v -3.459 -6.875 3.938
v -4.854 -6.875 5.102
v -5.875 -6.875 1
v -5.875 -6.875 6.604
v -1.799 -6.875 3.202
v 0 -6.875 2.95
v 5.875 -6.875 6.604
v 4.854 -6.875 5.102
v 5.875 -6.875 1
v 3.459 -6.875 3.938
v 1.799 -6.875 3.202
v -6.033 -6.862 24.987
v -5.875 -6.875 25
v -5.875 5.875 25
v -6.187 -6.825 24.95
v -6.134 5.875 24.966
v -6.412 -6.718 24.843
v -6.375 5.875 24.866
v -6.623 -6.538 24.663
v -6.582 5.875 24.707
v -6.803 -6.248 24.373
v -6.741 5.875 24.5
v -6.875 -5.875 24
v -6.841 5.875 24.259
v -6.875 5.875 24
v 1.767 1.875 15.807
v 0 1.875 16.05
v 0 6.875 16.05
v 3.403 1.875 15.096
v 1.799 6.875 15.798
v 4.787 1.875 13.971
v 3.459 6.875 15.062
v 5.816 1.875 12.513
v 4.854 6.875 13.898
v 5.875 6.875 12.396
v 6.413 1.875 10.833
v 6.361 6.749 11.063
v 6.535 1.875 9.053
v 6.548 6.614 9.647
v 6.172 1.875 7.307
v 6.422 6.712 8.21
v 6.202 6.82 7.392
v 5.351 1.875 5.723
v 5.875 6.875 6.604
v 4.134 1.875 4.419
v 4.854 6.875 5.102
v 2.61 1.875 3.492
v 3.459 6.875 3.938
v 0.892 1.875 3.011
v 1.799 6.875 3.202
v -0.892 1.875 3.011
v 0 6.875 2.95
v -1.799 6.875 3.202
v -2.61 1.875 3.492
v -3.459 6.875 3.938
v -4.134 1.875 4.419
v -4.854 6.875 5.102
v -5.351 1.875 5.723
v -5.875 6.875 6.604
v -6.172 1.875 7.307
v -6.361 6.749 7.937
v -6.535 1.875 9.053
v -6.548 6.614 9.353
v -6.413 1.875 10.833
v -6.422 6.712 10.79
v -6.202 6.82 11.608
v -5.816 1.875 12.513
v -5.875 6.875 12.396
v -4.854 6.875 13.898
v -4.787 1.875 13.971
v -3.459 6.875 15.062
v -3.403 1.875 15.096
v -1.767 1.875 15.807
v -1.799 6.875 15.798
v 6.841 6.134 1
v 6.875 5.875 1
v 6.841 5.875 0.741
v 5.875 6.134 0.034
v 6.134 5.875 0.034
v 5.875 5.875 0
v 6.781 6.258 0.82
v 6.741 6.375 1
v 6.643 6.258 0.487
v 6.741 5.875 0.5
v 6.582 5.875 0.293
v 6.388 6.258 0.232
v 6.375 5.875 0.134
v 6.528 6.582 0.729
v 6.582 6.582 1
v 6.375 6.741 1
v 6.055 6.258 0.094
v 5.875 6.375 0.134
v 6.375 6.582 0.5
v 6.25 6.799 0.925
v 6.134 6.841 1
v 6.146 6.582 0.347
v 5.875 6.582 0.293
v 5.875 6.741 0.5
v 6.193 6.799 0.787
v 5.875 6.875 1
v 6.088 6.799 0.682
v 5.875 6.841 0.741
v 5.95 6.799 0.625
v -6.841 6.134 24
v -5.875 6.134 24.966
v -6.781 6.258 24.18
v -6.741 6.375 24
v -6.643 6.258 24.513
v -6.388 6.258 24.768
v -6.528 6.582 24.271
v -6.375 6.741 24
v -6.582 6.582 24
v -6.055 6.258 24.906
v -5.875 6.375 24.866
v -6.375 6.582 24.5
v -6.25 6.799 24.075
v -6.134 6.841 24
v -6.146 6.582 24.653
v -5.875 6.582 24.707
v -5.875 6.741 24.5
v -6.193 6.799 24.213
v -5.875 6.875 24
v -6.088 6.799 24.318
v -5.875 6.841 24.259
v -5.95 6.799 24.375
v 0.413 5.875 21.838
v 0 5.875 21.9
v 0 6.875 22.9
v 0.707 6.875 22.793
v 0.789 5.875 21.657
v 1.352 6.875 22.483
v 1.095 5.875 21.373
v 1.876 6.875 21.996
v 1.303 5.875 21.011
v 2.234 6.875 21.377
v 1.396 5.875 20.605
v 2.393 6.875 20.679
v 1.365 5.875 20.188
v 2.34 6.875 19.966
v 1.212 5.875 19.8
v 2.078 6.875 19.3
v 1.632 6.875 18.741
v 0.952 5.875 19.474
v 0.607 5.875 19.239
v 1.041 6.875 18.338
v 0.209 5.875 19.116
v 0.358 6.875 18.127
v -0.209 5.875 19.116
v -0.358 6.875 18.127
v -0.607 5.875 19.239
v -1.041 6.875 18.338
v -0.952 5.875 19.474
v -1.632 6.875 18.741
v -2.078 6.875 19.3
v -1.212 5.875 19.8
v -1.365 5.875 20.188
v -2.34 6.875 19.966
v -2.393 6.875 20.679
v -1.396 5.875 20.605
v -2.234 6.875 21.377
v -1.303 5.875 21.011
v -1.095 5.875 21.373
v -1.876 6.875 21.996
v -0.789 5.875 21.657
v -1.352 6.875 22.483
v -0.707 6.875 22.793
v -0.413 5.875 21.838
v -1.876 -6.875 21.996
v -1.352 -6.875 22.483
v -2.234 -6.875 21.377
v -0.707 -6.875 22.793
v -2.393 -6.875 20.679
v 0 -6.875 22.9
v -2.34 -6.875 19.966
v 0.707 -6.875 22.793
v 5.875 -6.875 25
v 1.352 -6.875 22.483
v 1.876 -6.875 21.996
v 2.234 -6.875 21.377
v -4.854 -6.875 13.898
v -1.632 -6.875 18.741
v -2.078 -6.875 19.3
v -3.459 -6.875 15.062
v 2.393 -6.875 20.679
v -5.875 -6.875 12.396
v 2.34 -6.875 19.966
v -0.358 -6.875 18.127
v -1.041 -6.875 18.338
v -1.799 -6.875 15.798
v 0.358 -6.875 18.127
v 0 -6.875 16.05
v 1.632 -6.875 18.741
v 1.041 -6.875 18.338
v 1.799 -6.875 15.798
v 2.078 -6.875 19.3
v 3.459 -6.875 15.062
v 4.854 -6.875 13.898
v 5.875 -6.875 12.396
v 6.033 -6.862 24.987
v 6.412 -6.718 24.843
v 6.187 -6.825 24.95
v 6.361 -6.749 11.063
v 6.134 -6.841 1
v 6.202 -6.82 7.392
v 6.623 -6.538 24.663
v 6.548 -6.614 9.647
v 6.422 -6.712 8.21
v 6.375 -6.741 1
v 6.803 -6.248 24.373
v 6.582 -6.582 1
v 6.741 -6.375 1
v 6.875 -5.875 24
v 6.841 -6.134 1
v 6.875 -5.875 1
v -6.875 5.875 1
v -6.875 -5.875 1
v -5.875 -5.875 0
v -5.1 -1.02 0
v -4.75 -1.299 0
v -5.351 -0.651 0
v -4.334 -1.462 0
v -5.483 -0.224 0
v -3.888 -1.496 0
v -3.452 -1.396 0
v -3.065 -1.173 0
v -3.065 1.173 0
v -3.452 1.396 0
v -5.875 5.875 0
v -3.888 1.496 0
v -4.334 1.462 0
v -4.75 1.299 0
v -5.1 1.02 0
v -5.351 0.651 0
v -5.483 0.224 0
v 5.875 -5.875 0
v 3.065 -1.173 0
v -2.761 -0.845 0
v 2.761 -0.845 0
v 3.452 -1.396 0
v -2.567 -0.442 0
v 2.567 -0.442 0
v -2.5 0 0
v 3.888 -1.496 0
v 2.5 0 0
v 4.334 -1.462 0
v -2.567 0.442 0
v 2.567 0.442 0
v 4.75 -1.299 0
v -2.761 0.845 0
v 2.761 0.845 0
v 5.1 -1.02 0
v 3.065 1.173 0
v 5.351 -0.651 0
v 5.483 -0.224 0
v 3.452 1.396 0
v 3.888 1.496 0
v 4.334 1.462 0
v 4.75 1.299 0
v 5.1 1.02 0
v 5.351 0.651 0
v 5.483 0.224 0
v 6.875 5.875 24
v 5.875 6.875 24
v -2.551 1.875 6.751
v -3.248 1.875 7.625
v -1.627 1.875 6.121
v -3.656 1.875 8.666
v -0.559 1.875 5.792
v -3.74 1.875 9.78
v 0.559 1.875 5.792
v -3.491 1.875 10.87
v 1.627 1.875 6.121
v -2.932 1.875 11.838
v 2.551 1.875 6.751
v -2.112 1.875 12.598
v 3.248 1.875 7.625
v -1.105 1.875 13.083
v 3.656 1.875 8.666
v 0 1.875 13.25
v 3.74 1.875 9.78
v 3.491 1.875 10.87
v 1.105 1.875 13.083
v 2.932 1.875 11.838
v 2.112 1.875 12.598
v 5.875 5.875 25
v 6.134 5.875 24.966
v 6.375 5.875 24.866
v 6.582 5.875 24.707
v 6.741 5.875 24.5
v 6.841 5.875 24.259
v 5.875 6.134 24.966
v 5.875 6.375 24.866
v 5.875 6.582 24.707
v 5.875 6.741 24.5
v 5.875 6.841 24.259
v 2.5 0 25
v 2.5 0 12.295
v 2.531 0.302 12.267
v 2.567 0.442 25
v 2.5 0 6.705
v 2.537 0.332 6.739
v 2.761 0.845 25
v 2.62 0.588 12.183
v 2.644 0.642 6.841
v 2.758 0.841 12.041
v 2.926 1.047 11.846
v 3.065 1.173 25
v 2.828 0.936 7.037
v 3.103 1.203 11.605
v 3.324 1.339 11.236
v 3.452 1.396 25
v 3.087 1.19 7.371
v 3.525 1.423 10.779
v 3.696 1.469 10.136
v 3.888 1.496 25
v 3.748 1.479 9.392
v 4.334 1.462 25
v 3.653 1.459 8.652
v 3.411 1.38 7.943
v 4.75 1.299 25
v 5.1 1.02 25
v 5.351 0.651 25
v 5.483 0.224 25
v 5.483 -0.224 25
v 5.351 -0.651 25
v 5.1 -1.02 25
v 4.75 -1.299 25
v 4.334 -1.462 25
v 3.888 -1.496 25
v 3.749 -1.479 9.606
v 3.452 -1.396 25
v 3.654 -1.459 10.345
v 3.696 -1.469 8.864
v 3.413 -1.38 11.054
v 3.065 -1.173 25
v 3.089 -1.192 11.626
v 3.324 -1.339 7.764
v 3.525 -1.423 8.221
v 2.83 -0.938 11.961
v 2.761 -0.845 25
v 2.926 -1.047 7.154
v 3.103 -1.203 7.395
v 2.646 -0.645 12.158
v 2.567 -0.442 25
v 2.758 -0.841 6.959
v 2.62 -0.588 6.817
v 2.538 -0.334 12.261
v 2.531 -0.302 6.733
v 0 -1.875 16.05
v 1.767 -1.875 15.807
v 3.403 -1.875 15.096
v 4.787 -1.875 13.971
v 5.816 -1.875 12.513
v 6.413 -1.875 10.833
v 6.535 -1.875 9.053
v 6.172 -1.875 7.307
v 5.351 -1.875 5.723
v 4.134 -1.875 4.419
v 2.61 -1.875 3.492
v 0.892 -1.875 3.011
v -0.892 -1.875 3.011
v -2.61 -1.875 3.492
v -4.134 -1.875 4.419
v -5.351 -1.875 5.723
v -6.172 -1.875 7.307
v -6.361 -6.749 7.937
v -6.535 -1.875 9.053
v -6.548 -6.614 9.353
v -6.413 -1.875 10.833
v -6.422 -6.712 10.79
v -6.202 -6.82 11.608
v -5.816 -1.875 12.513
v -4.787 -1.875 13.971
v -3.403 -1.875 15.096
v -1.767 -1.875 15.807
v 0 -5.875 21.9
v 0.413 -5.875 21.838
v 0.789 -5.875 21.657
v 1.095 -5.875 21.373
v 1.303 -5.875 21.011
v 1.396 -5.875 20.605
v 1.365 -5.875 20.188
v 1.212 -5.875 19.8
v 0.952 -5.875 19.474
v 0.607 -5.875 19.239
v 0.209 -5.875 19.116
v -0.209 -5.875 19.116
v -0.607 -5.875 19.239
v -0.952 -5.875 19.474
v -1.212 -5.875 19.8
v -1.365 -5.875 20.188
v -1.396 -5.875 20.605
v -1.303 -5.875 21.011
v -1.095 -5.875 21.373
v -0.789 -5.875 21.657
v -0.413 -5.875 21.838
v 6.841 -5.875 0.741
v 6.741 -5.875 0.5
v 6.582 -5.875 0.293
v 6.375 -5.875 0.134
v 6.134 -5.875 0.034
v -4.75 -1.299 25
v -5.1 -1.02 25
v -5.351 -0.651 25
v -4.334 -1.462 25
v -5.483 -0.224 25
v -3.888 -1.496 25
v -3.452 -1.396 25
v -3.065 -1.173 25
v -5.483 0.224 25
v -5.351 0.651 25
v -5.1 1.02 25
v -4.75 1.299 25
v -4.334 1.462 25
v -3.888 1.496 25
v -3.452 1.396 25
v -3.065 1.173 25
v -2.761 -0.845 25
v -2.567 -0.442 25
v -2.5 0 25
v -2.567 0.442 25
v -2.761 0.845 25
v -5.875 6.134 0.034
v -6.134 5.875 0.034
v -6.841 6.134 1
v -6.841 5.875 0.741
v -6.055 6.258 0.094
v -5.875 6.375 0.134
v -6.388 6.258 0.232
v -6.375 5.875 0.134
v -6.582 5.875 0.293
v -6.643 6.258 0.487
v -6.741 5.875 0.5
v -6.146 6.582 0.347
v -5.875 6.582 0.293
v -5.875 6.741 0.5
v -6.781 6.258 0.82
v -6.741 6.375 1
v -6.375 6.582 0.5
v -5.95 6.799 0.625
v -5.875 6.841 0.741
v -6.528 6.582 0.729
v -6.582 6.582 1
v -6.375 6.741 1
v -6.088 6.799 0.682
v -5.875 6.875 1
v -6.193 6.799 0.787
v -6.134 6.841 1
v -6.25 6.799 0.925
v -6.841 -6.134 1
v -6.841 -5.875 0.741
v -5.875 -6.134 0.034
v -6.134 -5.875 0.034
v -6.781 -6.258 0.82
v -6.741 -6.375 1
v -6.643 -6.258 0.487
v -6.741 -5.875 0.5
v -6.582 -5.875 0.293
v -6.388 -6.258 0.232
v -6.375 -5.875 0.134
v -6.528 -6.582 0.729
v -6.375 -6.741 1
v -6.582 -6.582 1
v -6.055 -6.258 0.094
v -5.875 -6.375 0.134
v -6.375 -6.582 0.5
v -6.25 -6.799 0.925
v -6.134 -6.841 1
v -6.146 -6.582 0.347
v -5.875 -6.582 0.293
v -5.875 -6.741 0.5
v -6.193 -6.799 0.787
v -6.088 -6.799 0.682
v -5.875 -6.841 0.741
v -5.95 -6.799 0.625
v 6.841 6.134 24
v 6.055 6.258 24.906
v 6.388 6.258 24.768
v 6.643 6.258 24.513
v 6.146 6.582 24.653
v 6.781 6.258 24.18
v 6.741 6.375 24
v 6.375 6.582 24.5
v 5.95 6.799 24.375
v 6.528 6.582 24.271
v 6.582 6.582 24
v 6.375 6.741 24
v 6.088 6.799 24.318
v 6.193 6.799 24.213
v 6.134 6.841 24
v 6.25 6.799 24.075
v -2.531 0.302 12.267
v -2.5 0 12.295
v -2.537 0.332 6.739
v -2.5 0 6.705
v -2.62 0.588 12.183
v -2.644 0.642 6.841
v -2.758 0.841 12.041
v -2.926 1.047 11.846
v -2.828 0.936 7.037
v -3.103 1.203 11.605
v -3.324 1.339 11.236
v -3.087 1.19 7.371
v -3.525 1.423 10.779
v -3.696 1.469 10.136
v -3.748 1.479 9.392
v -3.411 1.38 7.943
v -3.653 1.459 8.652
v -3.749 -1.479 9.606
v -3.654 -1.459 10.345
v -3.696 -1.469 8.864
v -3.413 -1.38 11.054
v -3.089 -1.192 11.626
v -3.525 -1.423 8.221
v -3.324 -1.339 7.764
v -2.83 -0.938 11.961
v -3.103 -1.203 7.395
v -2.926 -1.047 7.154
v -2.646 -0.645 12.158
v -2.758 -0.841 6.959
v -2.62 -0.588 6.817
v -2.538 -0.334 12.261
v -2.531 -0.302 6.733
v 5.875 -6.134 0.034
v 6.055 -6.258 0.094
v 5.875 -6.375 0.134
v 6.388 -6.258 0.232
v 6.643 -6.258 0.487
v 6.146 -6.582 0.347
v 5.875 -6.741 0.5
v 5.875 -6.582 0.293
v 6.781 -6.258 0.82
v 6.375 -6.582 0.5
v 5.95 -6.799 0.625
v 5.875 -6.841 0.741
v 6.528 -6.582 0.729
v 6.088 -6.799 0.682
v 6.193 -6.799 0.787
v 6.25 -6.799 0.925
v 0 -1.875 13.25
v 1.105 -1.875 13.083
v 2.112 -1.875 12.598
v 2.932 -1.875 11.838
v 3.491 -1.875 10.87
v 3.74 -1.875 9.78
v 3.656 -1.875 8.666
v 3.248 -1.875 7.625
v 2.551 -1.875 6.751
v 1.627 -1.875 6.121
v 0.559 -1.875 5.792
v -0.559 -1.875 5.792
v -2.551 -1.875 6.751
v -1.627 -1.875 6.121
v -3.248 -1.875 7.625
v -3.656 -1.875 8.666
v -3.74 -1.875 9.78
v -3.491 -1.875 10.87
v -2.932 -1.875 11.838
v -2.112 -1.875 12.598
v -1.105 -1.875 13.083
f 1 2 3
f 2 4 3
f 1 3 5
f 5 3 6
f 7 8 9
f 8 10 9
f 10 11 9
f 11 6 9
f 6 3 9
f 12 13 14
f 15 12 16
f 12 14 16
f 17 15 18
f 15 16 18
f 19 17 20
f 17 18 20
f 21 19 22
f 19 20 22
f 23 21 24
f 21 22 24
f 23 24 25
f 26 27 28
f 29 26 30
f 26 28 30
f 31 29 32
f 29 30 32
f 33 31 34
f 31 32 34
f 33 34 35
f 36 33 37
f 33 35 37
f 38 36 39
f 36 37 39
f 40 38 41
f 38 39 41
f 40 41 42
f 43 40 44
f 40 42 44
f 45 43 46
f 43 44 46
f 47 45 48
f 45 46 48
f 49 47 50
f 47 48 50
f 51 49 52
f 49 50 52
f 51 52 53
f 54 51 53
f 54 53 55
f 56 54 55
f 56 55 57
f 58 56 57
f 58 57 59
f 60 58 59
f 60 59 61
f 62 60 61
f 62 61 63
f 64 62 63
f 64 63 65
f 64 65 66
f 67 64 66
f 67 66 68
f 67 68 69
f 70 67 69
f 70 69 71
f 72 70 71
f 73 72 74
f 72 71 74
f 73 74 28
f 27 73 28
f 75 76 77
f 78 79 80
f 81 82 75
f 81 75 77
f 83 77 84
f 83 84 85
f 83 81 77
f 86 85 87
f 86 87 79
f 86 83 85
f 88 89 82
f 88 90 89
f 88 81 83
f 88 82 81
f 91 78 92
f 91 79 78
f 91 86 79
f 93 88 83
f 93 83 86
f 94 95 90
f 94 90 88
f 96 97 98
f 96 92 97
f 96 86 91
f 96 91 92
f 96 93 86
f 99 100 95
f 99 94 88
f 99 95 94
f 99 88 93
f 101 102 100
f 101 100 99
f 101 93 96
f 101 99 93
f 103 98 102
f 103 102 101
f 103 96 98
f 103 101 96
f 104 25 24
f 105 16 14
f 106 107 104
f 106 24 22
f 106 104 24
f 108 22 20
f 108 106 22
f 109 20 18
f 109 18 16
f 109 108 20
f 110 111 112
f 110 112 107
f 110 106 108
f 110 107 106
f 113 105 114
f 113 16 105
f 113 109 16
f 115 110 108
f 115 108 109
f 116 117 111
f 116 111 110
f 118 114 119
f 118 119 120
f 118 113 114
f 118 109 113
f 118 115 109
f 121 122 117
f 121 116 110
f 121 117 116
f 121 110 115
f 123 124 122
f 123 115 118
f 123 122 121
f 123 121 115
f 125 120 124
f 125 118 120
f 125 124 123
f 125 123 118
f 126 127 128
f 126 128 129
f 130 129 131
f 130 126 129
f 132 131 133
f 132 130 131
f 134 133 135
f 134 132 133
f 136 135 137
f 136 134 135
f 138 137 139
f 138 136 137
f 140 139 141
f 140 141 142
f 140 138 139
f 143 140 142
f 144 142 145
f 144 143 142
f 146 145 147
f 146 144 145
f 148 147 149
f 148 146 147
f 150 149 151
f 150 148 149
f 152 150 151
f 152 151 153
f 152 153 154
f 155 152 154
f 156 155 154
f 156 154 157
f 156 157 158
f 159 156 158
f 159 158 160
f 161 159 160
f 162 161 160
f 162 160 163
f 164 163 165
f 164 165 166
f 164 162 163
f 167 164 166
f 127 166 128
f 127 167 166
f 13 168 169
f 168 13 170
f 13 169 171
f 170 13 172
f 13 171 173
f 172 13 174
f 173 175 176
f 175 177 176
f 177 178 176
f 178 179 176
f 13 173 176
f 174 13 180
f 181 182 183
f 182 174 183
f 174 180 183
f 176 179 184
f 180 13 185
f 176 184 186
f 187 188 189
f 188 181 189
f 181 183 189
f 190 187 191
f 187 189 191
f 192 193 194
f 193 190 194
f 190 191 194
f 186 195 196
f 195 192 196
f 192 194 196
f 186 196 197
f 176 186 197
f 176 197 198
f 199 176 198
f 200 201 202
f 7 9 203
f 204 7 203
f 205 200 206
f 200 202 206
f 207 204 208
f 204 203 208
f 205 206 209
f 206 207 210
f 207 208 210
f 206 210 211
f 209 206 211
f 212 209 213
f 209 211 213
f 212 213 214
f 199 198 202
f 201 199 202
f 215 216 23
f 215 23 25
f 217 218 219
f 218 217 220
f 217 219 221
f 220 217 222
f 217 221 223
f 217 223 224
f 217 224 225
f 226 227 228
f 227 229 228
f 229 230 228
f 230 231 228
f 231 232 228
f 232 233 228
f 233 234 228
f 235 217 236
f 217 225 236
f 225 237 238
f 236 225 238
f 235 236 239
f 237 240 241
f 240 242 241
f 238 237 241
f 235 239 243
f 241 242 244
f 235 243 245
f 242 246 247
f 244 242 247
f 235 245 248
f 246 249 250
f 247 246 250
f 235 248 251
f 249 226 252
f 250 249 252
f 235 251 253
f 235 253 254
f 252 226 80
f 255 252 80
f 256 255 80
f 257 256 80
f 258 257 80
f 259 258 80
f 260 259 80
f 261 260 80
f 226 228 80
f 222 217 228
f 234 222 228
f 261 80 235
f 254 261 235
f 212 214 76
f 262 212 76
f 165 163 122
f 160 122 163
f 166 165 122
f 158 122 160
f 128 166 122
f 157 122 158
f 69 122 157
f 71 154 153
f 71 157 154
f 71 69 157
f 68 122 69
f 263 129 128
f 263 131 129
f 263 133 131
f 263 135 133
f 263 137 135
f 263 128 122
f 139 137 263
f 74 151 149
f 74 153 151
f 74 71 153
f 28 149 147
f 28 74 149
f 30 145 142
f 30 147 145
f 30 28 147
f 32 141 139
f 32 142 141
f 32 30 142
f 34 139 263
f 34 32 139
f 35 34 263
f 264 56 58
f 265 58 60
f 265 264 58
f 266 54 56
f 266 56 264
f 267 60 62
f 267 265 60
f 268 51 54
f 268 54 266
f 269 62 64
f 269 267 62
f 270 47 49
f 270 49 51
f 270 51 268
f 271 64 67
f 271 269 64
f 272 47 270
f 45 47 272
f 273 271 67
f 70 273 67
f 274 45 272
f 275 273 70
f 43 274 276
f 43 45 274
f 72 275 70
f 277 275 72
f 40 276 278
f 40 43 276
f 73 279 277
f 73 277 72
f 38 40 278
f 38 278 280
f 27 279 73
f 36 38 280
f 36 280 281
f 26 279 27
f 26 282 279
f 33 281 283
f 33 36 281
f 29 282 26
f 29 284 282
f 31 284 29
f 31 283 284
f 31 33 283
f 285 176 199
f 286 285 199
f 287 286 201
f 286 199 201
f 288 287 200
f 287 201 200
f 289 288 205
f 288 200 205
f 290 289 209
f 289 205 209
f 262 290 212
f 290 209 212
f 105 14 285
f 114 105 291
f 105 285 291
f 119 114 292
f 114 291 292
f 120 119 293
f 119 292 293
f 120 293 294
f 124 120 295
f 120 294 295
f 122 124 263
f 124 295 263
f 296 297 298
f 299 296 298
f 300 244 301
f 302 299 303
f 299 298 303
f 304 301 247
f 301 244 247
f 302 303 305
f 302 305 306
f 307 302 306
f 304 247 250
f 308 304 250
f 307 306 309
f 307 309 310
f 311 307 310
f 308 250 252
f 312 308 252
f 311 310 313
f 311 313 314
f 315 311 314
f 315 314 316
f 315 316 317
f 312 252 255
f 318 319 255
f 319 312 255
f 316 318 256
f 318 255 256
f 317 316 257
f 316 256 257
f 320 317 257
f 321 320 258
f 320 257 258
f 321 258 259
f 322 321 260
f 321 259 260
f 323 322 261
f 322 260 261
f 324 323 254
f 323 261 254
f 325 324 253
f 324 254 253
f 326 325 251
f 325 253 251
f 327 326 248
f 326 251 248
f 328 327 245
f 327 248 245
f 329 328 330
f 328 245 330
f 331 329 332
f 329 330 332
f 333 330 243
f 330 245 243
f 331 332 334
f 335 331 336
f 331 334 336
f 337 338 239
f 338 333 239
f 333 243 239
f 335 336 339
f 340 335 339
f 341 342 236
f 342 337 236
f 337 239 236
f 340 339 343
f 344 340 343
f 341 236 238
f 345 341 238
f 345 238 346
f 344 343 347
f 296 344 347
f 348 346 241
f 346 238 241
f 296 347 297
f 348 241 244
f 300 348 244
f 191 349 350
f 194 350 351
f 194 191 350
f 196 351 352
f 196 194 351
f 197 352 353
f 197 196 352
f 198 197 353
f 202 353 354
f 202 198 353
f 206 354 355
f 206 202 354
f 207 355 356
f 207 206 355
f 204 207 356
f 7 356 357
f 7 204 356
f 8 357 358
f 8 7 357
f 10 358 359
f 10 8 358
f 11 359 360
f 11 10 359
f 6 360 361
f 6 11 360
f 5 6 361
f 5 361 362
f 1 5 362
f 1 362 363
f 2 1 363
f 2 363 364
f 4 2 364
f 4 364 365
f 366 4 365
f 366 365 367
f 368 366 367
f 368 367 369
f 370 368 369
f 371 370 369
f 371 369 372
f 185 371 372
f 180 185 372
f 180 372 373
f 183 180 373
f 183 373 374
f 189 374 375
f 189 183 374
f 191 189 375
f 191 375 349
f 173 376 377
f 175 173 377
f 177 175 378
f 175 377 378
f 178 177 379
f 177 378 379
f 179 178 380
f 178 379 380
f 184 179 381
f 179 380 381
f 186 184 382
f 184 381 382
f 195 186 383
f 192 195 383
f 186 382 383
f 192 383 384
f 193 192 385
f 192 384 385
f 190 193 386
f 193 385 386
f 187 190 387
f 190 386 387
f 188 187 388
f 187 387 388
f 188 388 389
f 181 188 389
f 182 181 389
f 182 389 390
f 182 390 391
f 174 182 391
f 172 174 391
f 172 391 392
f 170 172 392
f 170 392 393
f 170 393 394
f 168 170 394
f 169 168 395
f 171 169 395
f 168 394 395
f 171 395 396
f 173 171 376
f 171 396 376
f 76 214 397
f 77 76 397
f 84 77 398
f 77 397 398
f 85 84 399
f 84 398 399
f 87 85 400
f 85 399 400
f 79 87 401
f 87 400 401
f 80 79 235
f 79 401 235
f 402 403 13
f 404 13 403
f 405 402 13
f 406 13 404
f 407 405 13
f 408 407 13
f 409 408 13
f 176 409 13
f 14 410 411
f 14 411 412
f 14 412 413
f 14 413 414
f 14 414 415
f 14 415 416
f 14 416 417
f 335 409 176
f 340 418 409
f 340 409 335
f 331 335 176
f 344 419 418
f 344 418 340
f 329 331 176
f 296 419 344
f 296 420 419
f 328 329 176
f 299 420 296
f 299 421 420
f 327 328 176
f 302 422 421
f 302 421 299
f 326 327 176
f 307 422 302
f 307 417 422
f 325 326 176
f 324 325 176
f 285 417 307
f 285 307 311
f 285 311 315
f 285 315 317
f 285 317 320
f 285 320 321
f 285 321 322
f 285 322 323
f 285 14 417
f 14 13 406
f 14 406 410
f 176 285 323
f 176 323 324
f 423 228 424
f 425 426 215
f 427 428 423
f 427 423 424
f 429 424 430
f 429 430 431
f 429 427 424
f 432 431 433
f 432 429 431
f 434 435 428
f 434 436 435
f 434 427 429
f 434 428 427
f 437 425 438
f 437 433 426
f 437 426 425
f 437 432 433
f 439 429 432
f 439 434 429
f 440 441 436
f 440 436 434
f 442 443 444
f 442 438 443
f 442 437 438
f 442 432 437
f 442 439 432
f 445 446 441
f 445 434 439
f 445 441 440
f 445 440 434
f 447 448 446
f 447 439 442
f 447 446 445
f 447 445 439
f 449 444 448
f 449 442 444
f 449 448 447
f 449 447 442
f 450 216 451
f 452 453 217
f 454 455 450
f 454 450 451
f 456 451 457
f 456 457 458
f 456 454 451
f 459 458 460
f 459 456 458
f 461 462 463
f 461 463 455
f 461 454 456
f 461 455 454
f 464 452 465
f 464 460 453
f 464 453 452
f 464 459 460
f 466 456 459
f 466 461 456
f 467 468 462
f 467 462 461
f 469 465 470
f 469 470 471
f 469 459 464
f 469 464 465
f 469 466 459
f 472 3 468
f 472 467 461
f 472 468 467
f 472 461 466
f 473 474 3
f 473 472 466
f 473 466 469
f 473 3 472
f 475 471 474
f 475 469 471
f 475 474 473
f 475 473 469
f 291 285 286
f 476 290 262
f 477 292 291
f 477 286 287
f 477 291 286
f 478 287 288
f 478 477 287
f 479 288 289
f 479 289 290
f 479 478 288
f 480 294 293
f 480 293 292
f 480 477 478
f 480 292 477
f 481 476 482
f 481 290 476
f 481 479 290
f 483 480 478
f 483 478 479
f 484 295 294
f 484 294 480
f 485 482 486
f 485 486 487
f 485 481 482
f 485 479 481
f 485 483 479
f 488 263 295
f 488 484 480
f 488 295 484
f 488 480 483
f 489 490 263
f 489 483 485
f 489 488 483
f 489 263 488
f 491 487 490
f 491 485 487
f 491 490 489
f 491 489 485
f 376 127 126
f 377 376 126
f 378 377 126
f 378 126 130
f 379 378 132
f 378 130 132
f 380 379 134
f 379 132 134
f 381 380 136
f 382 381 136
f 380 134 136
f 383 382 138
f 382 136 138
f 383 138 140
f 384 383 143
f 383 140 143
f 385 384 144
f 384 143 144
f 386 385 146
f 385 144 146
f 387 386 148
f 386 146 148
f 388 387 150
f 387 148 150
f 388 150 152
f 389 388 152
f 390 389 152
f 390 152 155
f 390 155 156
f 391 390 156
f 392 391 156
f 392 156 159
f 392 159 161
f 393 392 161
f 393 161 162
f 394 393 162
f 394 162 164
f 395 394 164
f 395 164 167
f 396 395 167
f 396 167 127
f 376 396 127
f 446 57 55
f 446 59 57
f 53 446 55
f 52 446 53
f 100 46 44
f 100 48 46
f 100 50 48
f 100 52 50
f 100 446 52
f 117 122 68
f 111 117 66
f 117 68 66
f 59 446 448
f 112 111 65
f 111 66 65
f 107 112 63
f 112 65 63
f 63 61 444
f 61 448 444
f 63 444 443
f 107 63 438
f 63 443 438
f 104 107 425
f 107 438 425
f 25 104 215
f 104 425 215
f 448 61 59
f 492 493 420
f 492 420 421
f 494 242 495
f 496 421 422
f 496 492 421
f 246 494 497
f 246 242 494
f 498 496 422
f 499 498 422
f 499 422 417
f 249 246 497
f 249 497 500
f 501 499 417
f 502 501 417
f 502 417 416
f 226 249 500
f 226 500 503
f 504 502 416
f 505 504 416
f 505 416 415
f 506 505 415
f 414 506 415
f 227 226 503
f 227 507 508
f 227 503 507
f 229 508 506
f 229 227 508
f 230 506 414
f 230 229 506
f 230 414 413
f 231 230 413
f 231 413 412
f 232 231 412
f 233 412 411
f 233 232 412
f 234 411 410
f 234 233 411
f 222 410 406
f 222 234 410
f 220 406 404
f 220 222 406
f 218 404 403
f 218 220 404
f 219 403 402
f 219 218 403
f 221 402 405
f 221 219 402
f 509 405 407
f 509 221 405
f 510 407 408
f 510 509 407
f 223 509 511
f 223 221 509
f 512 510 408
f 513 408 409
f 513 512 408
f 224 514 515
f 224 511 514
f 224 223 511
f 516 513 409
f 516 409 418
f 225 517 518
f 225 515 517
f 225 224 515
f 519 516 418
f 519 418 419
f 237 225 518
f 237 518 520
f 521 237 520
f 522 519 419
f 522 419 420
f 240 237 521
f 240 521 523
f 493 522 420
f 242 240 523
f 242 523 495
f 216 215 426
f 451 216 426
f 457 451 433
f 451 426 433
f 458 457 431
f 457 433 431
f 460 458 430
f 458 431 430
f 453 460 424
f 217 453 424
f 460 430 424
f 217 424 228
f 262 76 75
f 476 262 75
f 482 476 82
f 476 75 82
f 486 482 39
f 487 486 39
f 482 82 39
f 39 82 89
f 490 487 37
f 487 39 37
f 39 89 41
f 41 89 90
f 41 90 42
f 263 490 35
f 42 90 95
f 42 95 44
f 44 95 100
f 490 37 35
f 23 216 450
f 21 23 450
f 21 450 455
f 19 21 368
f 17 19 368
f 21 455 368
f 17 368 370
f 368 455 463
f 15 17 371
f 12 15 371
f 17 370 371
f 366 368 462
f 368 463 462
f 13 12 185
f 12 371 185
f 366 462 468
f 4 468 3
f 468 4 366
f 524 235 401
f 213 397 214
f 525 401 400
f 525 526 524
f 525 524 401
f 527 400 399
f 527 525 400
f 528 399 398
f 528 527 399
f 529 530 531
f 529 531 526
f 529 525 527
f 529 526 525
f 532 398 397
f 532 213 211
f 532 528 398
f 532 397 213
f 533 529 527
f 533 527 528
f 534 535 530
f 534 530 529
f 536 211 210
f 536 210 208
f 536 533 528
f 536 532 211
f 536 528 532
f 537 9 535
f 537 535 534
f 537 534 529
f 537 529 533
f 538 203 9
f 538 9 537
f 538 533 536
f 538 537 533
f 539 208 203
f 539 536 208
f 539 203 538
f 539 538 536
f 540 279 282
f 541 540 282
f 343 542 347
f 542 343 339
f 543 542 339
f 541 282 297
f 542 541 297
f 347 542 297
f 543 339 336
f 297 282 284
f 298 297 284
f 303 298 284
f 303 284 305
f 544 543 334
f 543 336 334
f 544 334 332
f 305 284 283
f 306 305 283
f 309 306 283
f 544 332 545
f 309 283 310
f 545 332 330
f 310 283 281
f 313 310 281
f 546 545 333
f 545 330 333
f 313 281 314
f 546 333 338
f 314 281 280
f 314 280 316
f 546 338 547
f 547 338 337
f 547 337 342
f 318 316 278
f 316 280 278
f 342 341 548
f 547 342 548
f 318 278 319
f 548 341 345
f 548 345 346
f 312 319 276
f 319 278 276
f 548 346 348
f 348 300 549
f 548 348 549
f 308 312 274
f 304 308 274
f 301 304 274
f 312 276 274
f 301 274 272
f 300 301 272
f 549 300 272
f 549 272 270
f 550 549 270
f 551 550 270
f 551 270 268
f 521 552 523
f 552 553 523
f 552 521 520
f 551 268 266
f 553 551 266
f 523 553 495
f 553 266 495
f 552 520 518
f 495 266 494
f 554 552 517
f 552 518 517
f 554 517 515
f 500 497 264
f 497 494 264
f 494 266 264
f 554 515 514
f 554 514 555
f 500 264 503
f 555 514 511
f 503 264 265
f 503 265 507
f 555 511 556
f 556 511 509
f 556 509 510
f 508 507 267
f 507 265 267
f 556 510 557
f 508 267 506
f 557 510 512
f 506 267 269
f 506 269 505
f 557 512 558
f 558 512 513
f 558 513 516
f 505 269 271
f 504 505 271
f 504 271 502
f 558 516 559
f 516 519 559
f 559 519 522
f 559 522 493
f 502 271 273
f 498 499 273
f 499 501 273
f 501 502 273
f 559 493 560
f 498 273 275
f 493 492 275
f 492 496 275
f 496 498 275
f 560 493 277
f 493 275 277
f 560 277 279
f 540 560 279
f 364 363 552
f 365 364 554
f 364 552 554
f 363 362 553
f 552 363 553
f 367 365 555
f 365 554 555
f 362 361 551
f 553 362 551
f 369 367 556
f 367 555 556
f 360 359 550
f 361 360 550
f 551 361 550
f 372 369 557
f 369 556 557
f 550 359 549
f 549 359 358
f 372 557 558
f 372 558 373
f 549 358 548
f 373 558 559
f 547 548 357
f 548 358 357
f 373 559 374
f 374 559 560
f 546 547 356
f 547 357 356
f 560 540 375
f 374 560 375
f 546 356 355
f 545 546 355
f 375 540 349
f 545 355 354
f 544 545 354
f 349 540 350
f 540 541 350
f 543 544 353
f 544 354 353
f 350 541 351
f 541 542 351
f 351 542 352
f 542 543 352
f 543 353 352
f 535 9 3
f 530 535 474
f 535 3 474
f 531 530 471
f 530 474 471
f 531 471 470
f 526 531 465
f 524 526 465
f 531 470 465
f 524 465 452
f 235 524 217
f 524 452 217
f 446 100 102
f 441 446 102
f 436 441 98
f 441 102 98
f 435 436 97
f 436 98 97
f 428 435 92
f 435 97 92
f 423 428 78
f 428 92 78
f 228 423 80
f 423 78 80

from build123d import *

# Parameters (mm, degrees)
SKETCH1_W           = 13.75
SKETCH1_H           = 13.75
BOSS_EXTRUDE1_DEPTH = 25
SKETCH3_R           = 3.75
CUT_EXTRUDE2_DEPTH  = 30.348392205
SKETCH4_R           = 6.55
CUT_EXTRUDE3_DEPTH  = 5
SKETCH8_R           = 1.4
CUT_EXTRUDE6_DEPTH  = 30.348392205
SKETCH9_R           = 1.5
CUT_EXTRUDE7_DEPTH  = 27.824079667
CHAMFER1_SIZE       = 1
FILLET2_R           = 1


with BuildPart() as part:
    # Sketch1 → Boss-Extrude1 (new body)
    with BuildSketch(Plane.XY):
        Rectangle(SKETCH1_W, SKETCH1_H)
    extrude(amount=BOSS_EXTRUDE1_DEPTH)

    # Sketch3 → Cut-Extrude2 (cut, through all)
    with BuildSketch(Plane(origin=(0, 6.875, 0), x_dir=(1, 0, 0), z_dir=(0, 1, 0))):
        with Locations(Location((0, -9.5, 0), (0, 0, 270))):
            Circle(SKETCH3_R)
    extrude(amount=-CUT_EXTRUDE2_DEPTH, mode=Mode.SUBTRACT)

    # Sketch4 → Cut-Extrude3 (cut)
    with BuildSketch(Plane(origin=(0, 6.875, 0), x_dir=(1, 0, 0), z_dir=(0, 1, 0))):
        with Locations(Location((0, -9.5, 0), (0, 0, 270))):
            Circle(SKETCH4_R)
    cut_extrude3 = extrude(amount=-CUT_EXTRUDE3_DEPTH, mode=Mode.SUBTRACT)

    # Mirror4: Cut-Extrude3 across plane
    add(cut_extrude3.mirror(Plane.ZX), mode=Mode.SUBTRACT)

    # Sketch8 → Cut-Extrude6 (cut, through all)
    with BuildSketch(Plane(origin=(0, 6.875, 0), x_dir=(1, 0, 0), z_dir=(0, 1, 0))):
        with Locations(Location((0, -20.5, 0), (0, 0, 270))):
            Circle(SKETCH8_R)
    extrude(amount=-CUT_EXTRUDE6_DEPTH, mode=Mode.SUBTRACT)

    # Sketch9 → Cut-Extrude7 (cut, through all)
    with BuildSketch(Plane(origin=(0, 0, 0), x_dir=(-1, 0, 0), z_dir=(0, 0, -1))):
        with Locations((-4, 0)):
            Circle(SKETCH9_R)
    cut_extrude7 = extrude(amount=-CUT_EXTRUDE7_DEPTH, mode=Mode.SUBTRACT)

    # Mirror5: Cut-Extrude7 across plane
    add(cut_extrude7.mirror(Plane(origin=(0, 0, 0), x_dir=(0, 0, 1), z_dir=(1, 0, 0))), mode=Mode.SUBTRACT)

    # Chamfer1
    chamfer1_edges = [part.edges().sort_by_distance(p)[0] for p in [
        (0, -6.875, 19.1),
        (0, 6.875, 19.1),
    ]]
    chamfer(chamfer1_edges, length=CHAMFER1_SIZE)

    # Fillet2
    # the kernel refuses this fillet: 1 mm, written as the material it takes off along each edge
    with BuildSketch(Plane(origin=(-5.875, 5.875, 24), x_dir=(-1, 0, 0), z_dir=(0, 1, 0))) as fillet2_piece_1_section:
        Polygon((0, 0), (FILLET2_R, 0), (FILLET2_R, FILLET2_R), (0, FILLET2_R), align=None)
    fillet2_piece_1 = extrude(amount=FILLET2_R, mode=Mode.PRIVATE)
    fillet2_piece_1 = fillet2_piece_1 - Plane(origin=(-5.875, 5.875, 24), x_dir=(0.7071067811865475, 0, -0.7071067811865475), z_dir=(0, 1, 0)) * Sphere(FILLET2_R, mode=Mode.PRIVATE)
    add(fillet2_piece_1, mode=Mode.SUBTRACT)
    with BuildSketch(Plane(origin=(5.875, 5.875, 24), x_dir=(0, 0, 1), z_dir=(0, 1, 0))) as fillet2_piece_2_section:
        Polygon((0, 0), (FILLET2_R, 0), (FILLET2_R, FILLET2_R), (0, FILLET2_R), align=None)
    fillet2_piece_2 = extrude(amount=FILLET2_R, mode=Mode.PRIVATE)
    fillet2_piece_2 = fillet2_piece_2 - Plane(origin=(5.875, 5.875, 24), x_dir=(-0.7071067811865475, 0, -0.7071067811865475), z_dir=(0, 1, 0)) * Sphere(FILLET2_R, mode=Mode.PRIVATE)
    add(fillet2_piece_2, mode=Mode.SUBTRACT)
    with BuildSketch(Plane(origin=(-5.875, -5.875, 1), x_dir=(-1, 0, 0), z_dir=(0, -1, 0))) as fillet2_piece_3_section:
        Polygon((0, 0), (FILLET2_R, 0), (FILLET2_R, FILLET2_R), (0, FILLET2_R), align=None)
    fillet2_piece_3 = extrude(amount=FILLET2_R, mode=Mode.PRIVATE)
    fillet2_piece_3 = fillet2_piece_3 - Plane(origin=(-5.875, -5.875, 1), x_dir=(0.7071067811865475, 0, 0.7071067811865475), z_dir=(0, -1, 0)) * Sphere(FILLET2_R, mode=Mode.PRIVATE)
    add(fillet2_piece_3, mode=Mode.SUBTRACT)
    with BuildSketch(Plane(origin=(5.875, -5.875, 1), x_dir=(0, 0, -1), z_dir=(0, -1, 0))) as fillet2_piece_4_section:
        Polygon((0, 0), (FILLET2_R, 0), (FILLET2_R, FILLET2_R), (0, FILLET2_R), align=None)
    fillet2_piece_4 = extrude(amount=FILLET2_R, mode=Mode.PRIVATE)
    fillet2_piece_4 = fillet2_piece_4 - Plane(origin=(5.875, -5.875, 1), x_dir=(-0.7071067811865475, 0, 0.7071067811865475), z_dir=(0, -1, 0)) * Sphere(FILLET2_R, mode=Mode.PRIVATE)
    add(fillet2_piece_4, mode=Mode.SUBTRACT)
    with BuildSketch(Plane(origin=(-5.875, 5.875, 1), x_dir=(-1, 0, 0), z_dir=(0, 1, 0))) as fillet2_piece_5_section:
        Polygon((0, 0), (FILLET2_R, 0), (FILLET2_R, -FILLET2_R), (0, -FILLET2_R), align=None)
    fillet2_piece_5 = extrude(amount=FILLET2_R, mode=Mode.PRIVATE)
    fillet2_piece_5 = fillet2_piece_5 - Plane(origin=(-5.875, 5.875, 1), x_dir=(0.7071067811865475, 0, 0.7071067811865475), z_dir=(0, 1, 0)) * Sphere(FILLET2_R, mode=Mode.PRIVATE)
    add(fillet2_piece_5, mode=Mode.SUBTRACT)
    with BuildSketch(Plane(origin=(5.875, 5.875, 1), x_dir=(0, 0, -1), z_dir=(0, 1, 0))) as fillet2_piece_6_section:
        Polygon((0, 0), (FILLET2_R, 0), (FILLET2_R, -FILLET2_R), (0, -FILLET2_R), align=None)
    fillet2_piece_6 = extrude(amount=FILLET2_R, mode=Mode.PRIVATE)
    fillet2_piece_6 = fillet2_piece_6 - Plane(origin=(5.875, 5.875, 1), x_dir=(-0.7071067811865475, 0, 0.7071067811865475), z_dir=(0, 1, 0)) * Sphere(FILLET2_R, mode=Mode.PRIVATE)
    add(fillet2_piece_6, mode=Mode.SUBTRACT)
    with BuildSketch(Plane(origin=(-6.875, 5.875, 25), x_dir=(0, 0, -1), z_dir=(0, -1, 0))) as fillet2_piece_7:
        with BuildLine():
            CenterArc((FILLET2_R, FILLET2_R), FILLET2_R, 180, 90)
            Line((0, FILLET2_R), (0, 0))
            Line((0, 0), (FILLET2_R, 0))
        make_face()
    extrude(amount=15.25, mode=Mode.SUBTRACT)
    with BuildSketch(Plane(origin=(6.875, -9.375, 25), x_dir=(-1, 0, 0), z_dir=(0, 1, 0))) as fillet2_piece_8:
        with BuildLine():
            CenterArc((FILLET2_R, -FILLET2_R), FILLET2_R, 90, 90)
            Line((0, -FILLET2_R), (0, 0))
            Line((0, 0), (FILLET2_R, 0))
        make_face()
    extrude(amount=15.25, mode=Mode.SUBTRACT)
    with BuildSketch(Plane(origin=(-5.875, -6.875, 0), x_dir=(0, 0, 1), z_dir=(1, 0, 0)), Plane(origin=(-6.875, 5.875, 0), x_dir=(0, 0, 1), z_dir=(0, -1, 0)), Plane(origin=(5.875, 6.875, 25), x_dir=(0, -1, 0), z_dir=(-1, 0, 0))) as fillet2_piece_9:
        with BuildLine():
            CenterArc((FILLET2_R, -FILLET2_R), FILLET2_R, 90, 90)
            Line((0, -FILLET2_R), (0, 0))
            Line((0, 0), (FILLET2_R, 0))
        make_face()
    extrude(amount=11.75, mode=Mode.SUBTRACT)
    with BuildSketch(Plane(origin=(5.875, 6.875, 0), x_dir=(0, -1, 0), z_dir=(-1, 0, 0)), Plane(origin=(6.875, -5.875, 0), x_dir=(-1, 0, 0), z_dir=(0, 1, 0))) as fillet2_piece_10:
        with BuildLine():
            CenterArc((FILLET2_R, FILLET2_R), FILLET2_R, 180, 90)
            Line((0, FILLET2_R), (0, 0))
            Line((0, 0), (FILLET2_R, 0))
        make_face()
    extrude(amount=11.75, mode=Mode.SUBTRACT)
    with BuildSketch(Plane(origin=(6.875, -6.875, 1), x_dir=(-1, 0, 0), z_dir=(0, 0, 1))) as fillet2_piece_11:
        with BuildLine():
            CenterArc((FILLET2_R, -FILLET2_R), FILLET2_R, 90, 90)
            Line((0, -FILLET2_R), (0, 0))
            Line((0, 0), (FILLET2_R, 0))
        make_face()
    extrude(amount=26.5, mode=Mode.SUBTRACT)
    with BuildSketch(Plane(origin=(-6.875, -6.875, 1), x_dir=(1, 0, 0), z_dir=(0, 0, 1))) as fillet2_piece_12:
        with BuildLine():
            CenterArc((FILLET2_R, FILLET2_R), FILLET2_R, 180, 90)
            Line((0, FILLET2_R), (0, 0))
            Line((0, 0), (FILLET2_R, 0))
        make_face()
    extrude(amount=26.5, mode=Mode.SUBTRACT)
    with BuildSketch(Plane(origin=(-6.875, 6.875, 1), x_dir=(0, -1, 0), z_dir=(0, 0, 1))) as fillet2_piece_13:
        with BuildLine():
            CenterArc((FILLET2_R, FILLET2_R), FILLET2_R, 180, 90)
            Line((0, FILLET2_R), (0, 0))
            Line((0, 0), (FILLET2_R, 0))
        make_face()
    extrude(amount=23, mode=Mode.SUBTRACT)
    with BuildSketch(Plane(origin=(6.875, 6.875, 1), x_dir=(0, -1, 0), z_dir=(0, 0, 1))) as fillet2_piece_14:
        with BuildLine():
            CenterArc((FILLET2_R, -FILLET2_R), FILLET2_R, 90, 90)
            Line((0, -FILLET2_R), (0, 0))
            Line((0, 0), (FILLET2_R, 0))
        make_face()
    extrude(amount=23, mode=Mode.SUBTRACT)


solid = part.part
